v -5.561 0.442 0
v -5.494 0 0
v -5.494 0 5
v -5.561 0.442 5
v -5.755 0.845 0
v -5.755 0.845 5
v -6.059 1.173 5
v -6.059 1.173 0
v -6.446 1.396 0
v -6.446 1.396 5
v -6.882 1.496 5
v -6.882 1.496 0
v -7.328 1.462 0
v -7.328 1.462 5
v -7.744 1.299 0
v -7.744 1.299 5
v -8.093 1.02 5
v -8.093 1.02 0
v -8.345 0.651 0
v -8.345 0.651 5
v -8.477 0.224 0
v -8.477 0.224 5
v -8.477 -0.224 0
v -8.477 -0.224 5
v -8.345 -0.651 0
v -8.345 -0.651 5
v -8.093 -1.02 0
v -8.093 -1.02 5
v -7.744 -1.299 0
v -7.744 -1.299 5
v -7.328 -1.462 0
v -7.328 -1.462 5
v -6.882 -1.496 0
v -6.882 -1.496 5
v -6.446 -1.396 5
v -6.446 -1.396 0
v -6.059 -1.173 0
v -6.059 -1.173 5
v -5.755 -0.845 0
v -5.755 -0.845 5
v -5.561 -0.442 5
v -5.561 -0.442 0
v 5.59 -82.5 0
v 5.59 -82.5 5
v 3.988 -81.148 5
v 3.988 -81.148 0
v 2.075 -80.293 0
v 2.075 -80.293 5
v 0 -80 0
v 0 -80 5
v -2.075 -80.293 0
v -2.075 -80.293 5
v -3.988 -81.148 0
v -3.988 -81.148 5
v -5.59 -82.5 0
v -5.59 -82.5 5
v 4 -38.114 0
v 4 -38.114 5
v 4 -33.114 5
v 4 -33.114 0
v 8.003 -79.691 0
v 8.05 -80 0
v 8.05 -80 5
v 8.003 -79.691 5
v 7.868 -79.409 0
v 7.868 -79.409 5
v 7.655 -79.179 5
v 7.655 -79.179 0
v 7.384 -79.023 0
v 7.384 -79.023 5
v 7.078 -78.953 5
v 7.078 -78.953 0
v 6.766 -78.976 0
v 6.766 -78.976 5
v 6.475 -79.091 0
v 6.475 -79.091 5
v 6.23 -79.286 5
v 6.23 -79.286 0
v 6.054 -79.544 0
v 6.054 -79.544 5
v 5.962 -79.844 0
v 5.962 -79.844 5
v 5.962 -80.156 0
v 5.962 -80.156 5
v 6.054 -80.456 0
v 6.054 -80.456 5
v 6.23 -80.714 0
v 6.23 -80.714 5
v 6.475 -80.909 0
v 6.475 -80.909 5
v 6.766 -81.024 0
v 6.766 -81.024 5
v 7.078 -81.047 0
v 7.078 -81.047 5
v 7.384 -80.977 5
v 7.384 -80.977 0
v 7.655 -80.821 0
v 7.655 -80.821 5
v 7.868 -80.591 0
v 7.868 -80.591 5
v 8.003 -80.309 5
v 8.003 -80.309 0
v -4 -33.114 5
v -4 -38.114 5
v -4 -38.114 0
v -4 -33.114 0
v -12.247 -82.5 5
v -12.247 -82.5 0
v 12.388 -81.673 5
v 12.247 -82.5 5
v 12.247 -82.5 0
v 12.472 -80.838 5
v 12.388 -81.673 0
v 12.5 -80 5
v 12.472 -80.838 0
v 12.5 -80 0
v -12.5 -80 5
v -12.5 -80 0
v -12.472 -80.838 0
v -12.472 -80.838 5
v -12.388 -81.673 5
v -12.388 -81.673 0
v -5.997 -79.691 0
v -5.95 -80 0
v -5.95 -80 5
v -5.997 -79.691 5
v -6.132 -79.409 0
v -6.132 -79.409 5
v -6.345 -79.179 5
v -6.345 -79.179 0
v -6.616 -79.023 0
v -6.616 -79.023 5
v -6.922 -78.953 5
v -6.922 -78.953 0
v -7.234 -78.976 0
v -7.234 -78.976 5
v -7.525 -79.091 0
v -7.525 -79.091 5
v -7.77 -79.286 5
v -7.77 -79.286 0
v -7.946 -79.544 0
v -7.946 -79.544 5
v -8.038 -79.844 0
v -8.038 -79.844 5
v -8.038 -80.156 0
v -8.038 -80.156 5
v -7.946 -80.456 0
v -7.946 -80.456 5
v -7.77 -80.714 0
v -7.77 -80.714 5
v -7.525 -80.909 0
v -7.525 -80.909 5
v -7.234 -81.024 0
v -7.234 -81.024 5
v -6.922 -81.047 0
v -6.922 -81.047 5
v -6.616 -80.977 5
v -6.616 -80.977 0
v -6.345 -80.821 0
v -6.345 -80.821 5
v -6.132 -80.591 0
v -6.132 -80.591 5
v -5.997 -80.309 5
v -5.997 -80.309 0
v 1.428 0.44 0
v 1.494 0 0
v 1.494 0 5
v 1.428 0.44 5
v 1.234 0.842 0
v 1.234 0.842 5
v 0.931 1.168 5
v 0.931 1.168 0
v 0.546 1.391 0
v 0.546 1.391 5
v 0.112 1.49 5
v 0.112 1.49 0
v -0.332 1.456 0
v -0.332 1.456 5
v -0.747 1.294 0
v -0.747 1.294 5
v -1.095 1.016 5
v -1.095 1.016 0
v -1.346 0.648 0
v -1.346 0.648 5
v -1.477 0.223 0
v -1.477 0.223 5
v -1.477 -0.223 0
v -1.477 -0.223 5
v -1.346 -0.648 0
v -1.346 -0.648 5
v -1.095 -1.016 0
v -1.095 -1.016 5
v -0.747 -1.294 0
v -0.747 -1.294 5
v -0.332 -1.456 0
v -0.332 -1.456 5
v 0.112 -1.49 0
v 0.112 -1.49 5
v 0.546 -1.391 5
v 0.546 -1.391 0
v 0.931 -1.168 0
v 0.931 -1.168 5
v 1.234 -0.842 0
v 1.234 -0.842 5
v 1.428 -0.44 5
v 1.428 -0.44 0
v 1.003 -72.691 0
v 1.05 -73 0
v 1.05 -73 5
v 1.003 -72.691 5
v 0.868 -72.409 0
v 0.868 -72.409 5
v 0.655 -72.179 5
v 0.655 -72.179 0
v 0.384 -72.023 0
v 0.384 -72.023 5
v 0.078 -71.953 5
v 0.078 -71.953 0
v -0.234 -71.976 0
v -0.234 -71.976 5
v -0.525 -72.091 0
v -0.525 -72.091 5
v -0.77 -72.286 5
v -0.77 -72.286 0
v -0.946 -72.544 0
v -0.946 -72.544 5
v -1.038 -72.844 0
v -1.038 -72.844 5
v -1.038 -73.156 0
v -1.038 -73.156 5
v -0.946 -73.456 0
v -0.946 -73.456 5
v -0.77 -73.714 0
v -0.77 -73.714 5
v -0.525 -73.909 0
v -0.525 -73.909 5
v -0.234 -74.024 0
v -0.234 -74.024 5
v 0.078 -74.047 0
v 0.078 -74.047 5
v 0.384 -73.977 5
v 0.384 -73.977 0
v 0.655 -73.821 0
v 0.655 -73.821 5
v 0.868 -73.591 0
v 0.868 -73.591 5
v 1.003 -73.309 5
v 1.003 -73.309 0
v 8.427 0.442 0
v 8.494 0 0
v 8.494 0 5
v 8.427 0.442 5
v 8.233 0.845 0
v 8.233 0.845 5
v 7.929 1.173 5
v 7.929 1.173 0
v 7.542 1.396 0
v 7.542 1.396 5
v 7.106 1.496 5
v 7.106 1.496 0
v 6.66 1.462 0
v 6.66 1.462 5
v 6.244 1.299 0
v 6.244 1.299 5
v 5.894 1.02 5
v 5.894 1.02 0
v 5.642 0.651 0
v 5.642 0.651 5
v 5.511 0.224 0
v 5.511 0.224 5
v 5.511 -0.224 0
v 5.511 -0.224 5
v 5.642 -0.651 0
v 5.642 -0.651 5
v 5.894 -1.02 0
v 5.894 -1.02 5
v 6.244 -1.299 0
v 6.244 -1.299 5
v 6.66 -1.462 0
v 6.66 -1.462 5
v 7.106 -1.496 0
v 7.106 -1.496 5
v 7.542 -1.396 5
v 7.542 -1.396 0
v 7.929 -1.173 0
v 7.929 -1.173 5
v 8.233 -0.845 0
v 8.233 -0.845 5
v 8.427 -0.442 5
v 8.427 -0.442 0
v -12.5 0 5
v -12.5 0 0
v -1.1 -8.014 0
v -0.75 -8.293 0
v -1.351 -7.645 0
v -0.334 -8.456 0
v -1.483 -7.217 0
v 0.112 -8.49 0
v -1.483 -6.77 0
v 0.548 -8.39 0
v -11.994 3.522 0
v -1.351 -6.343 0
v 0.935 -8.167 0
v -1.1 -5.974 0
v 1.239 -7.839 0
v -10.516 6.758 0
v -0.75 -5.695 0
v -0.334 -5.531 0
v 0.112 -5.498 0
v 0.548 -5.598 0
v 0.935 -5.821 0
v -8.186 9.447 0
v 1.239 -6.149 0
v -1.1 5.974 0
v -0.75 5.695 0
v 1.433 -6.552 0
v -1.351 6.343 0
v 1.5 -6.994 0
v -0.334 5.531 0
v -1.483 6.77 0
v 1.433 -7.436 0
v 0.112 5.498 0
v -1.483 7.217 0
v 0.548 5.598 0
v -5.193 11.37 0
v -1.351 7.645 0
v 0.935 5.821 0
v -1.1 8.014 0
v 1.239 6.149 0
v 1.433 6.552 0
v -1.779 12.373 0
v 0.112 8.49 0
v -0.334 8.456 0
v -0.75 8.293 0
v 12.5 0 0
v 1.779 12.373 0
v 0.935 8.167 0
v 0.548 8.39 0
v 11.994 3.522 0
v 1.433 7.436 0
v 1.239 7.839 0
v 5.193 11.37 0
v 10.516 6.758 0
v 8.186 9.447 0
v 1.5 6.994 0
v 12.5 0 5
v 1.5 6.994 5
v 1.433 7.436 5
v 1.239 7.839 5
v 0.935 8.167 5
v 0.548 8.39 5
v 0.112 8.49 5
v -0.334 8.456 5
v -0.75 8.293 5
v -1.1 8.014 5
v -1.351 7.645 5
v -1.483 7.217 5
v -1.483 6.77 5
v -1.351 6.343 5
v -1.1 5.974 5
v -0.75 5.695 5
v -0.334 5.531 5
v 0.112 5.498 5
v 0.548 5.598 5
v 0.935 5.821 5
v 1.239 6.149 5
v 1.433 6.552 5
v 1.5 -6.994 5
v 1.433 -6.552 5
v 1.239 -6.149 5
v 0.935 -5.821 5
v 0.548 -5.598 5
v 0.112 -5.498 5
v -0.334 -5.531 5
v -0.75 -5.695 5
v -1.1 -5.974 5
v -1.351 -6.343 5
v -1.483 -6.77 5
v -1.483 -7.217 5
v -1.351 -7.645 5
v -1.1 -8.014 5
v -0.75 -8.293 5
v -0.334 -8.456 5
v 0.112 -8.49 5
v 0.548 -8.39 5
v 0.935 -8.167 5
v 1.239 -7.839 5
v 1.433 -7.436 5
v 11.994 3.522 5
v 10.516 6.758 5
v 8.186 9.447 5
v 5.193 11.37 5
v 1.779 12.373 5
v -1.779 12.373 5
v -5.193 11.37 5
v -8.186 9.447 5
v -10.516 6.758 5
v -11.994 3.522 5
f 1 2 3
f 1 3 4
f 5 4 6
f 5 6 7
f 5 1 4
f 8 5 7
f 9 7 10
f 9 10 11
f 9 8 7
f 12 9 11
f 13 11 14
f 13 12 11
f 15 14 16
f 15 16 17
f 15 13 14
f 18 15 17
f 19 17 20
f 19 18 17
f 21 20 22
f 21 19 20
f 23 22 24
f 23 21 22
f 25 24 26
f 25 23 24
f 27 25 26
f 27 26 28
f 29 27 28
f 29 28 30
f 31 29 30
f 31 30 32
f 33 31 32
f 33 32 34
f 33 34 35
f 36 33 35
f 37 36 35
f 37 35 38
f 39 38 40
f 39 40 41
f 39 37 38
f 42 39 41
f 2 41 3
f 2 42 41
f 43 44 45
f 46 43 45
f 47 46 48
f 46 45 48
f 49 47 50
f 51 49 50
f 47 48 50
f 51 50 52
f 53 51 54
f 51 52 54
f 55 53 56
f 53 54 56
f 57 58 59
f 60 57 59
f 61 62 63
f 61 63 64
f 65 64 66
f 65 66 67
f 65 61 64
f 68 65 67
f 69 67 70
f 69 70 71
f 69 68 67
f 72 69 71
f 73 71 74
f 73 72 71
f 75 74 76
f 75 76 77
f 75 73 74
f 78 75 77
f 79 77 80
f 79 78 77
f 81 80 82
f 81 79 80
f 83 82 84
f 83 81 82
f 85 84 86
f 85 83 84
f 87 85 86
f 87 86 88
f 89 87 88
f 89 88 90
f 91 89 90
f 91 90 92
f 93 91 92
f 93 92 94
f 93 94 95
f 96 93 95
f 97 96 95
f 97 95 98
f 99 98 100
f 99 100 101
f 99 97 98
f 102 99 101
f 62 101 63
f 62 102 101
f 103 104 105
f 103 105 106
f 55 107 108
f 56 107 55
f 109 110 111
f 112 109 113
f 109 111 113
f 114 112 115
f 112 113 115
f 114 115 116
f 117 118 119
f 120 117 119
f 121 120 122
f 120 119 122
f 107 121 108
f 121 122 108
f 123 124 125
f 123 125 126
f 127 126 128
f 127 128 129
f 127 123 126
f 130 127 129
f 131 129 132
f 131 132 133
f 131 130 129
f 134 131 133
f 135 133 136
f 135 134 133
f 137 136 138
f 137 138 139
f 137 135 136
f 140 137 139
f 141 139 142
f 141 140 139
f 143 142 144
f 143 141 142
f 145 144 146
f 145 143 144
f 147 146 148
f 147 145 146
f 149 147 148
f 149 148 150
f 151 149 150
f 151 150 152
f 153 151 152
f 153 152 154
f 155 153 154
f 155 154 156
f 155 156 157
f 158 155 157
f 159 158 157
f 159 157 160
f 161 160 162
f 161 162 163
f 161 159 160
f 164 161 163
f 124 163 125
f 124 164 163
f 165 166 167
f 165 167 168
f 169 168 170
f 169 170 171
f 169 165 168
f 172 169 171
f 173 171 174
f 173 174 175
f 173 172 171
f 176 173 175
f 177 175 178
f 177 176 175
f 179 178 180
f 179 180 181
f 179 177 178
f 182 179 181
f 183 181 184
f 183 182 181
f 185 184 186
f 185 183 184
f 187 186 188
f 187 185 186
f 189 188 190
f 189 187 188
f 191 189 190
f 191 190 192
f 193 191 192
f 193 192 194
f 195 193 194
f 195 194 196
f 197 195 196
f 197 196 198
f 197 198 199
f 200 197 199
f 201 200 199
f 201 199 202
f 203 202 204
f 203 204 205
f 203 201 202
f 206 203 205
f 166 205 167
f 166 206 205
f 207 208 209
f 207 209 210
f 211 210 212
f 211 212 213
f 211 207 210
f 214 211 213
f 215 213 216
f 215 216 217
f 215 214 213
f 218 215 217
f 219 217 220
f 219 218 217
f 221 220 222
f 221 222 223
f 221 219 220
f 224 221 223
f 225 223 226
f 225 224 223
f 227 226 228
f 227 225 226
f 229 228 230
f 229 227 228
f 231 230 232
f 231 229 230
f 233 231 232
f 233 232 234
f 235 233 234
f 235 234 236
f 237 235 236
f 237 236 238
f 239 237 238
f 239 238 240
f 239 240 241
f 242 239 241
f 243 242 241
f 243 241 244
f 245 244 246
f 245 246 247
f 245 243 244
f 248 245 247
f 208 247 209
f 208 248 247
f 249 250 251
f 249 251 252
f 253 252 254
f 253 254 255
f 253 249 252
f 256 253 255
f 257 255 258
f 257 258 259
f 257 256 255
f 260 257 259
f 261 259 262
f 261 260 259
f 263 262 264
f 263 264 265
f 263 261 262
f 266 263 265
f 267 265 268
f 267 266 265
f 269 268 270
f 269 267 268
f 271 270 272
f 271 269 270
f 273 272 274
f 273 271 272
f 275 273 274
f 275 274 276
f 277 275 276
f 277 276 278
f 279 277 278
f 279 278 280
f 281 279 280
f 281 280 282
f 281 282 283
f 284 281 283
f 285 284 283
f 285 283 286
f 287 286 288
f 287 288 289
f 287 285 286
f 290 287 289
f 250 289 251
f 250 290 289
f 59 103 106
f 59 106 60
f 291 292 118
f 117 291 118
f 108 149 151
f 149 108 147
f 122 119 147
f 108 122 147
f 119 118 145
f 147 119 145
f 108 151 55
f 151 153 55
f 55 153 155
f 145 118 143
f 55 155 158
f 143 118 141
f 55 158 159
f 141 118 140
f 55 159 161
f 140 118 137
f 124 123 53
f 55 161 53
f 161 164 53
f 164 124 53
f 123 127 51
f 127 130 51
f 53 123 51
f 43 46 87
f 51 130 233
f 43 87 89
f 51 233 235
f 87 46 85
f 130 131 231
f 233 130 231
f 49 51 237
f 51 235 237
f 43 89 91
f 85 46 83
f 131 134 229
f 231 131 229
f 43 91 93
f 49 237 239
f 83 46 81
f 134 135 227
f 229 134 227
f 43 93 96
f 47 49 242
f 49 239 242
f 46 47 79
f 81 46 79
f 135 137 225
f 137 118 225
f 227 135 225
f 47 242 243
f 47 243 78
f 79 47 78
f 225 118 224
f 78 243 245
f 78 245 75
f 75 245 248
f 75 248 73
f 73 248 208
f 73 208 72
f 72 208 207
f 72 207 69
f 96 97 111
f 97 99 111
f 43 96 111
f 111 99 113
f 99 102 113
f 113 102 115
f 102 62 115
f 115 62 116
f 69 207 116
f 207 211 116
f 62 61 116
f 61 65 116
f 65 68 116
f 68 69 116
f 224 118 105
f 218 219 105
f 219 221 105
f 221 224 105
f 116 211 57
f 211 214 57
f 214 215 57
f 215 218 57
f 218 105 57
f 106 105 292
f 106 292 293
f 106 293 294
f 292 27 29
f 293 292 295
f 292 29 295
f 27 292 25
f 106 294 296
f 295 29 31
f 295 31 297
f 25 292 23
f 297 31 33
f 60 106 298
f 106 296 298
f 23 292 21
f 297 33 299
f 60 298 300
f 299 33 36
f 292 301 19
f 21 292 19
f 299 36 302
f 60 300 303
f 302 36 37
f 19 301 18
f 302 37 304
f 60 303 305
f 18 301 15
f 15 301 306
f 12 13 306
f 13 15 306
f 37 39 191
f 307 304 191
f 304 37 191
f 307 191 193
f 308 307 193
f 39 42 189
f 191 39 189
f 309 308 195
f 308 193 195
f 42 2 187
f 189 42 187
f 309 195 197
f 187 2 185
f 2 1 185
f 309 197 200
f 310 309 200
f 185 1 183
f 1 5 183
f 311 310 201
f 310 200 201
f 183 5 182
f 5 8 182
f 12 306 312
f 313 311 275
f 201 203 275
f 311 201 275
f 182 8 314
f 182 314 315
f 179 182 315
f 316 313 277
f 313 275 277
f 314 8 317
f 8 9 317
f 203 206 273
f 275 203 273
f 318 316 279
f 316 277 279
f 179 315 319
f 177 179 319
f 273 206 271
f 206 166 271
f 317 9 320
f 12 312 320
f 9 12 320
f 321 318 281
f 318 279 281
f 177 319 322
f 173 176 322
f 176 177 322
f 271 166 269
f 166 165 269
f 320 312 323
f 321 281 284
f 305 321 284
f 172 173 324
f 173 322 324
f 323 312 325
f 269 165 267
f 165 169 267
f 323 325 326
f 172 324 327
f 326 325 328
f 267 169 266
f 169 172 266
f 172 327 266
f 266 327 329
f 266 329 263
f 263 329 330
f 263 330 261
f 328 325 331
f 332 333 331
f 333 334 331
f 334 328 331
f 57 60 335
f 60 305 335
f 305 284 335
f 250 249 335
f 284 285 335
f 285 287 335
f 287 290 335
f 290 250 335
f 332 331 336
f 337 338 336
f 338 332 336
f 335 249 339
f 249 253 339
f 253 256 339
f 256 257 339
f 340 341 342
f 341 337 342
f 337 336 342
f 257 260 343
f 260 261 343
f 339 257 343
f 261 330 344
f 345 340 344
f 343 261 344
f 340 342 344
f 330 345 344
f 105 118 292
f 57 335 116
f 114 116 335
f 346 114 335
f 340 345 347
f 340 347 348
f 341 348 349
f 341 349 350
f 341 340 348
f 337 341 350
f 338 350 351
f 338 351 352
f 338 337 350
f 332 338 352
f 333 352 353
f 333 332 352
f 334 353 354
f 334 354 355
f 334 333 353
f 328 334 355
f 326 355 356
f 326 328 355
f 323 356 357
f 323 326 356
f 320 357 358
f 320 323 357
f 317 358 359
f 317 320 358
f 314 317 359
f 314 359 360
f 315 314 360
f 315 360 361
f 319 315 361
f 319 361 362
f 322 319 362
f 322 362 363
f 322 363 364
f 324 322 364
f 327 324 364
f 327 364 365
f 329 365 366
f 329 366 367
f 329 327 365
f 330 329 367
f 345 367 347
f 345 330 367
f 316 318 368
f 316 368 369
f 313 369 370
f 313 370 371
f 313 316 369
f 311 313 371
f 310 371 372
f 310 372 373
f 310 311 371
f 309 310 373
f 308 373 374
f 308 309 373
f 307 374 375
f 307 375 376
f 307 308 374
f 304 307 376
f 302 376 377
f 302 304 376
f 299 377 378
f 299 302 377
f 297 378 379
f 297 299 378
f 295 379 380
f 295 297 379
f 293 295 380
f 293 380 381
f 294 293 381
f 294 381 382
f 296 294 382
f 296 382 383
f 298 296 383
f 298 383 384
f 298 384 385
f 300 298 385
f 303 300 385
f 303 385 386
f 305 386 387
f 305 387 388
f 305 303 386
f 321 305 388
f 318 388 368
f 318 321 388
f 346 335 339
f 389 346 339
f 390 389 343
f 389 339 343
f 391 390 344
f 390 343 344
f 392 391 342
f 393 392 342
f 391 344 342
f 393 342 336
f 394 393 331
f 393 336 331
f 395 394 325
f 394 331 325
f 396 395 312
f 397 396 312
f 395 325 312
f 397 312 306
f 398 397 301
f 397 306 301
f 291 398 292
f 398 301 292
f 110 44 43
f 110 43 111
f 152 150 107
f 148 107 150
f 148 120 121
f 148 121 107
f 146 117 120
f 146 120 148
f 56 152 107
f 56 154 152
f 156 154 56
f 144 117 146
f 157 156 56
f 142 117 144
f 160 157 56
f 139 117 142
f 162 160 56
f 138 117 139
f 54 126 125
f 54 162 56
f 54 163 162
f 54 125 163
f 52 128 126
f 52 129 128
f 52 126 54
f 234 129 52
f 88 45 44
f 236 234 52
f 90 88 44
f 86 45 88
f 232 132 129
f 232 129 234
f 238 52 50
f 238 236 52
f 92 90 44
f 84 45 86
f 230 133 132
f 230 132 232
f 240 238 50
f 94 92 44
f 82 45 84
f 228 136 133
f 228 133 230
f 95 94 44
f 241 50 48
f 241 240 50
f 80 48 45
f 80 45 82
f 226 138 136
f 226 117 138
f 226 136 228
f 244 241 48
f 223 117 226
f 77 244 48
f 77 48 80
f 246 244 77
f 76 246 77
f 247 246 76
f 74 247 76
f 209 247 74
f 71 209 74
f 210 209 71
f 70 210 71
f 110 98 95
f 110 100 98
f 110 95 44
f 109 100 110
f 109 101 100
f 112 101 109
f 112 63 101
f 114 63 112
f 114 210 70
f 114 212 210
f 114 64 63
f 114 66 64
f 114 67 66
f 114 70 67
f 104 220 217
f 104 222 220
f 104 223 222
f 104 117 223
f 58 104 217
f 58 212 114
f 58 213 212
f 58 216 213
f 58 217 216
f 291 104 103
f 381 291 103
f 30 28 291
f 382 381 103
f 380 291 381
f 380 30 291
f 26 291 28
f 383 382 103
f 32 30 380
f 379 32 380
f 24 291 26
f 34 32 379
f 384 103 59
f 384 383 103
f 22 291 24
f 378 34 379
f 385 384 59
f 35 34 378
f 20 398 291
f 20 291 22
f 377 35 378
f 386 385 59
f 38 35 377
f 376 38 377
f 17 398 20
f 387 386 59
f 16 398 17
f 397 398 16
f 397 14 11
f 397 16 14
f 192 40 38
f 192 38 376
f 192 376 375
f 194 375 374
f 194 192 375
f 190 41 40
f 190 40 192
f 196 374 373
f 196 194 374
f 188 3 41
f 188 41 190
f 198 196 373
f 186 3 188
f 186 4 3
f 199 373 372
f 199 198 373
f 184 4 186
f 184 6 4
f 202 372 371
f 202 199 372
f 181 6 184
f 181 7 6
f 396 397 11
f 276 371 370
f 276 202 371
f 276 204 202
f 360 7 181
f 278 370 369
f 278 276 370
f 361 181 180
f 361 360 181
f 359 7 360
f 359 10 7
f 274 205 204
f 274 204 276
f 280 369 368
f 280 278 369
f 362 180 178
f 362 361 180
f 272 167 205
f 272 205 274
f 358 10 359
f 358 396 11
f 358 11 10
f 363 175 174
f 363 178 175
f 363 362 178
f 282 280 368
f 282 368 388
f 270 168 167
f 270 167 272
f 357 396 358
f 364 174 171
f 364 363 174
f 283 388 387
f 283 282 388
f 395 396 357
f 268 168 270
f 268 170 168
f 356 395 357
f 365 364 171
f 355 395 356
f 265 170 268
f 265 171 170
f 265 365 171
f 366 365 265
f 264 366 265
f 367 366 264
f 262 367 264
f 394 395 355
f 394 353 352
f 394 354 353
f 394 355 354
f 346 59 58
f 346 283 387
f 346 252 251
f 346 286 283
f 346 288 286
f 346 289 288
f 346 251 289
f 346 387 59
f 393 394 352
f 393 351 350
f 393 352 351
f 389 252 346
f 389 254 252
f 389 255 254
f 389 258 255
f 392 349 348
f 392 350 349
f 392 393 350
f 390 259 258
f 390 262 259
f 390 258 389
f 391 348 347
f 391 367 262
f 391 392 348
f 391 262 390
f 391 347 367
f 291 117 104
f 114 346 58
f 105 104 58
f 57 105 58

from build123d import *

# Parameters (mm, degrees)
SKETCH1_R           = 1.5
SKETCH1_R_2         = 1.493875789
SKETCH1_R_3         = 1.05
BOSS_EXTRUDE1_DEPTH = 5
SKETCH3_W           = 8
SKETCH3_H           = 5
CUT_EXTRUDE3_DEPTH  = 10
SKETCH5_R           = 7.5
SKETCH5_W           = 24.494897428
SKETCH5_H           = 10
CUT_EXTRUDE4_DEPTH  = 10


with BuildPart() as part:
    # Sketch1 → Boss-Extrude1 (new body)
    with BuildSketch(Plane.XY):
        with BuildLine():
            Line((-12.5, 0), (-12.5, -80))
            ThreePointArc((-12.5, -80), (0, -92.5), (12.5, -80))
            Line((12.5, -80), (12.5, 0))
            ThreePointArc((12.5, 0), (0, 12.5), (-12.5, 0))
        make_face()
        with Locations((0, 6.993875789)):
            Circle(SKETCH1_R, mode=Mode.SUBTRACT)
        Circle(SKETCH1_R_2, mode=Mode.SUBTRACT)
        with Locations((-7, -80)):
            Circle(SKETCH1_R_3, mode=Mode.SUBTRACT)
        with Locations((0, -73)):
            Circle(SKETCH1_R_3, mode=Mode.SUBTRACT)
        with Locations((7, -80)):
            Circle(SKETCH1_R_3, mode=Mode.SUBTRACT)
        with Locations((-6.993875789, 0)):
            Circle(SKETCH1_R, mode=Mode.SUBTRACT)
        with Locations((0, -6.993875789)):
            Circle(SKETCH1_R, mode=Mode.SUBTRACT)
        with Locations((6.993875789, 0)):
            Circle(SKETCH1_R, mode=Mode.SUBTRACT)
    extrude(amount=BOSS_EXTRUDE1_DEPTH)

    # Sketch3 → Cut-Extrude3 (cut)
    with BuildSketch(Plane.XY.offset(5)):
        with Locations((0, -35.613875789)):
            Rectangle(SKETCH3_W, SKETCH3_H)
    extrude(amount=-CUT_EXTRUDE3_DEPTH, mode=Mode.SUBTRACT)

    # Sketch5 → Cut-Extrude4 (cut)
    with BuildSketch(Plane.XY.offset(5)):
        with Locations((0, -87.5)):
            Circle(SKETCH5_R)
        with Locations((0, -87.5)):
            Rectangle(SKETCH5_W, SKETCH5_H)
    extrude(amount=-CUT_EXTRUDE4_DEPTH, mode=Mode.SUBTRACT)


solid = part.part
